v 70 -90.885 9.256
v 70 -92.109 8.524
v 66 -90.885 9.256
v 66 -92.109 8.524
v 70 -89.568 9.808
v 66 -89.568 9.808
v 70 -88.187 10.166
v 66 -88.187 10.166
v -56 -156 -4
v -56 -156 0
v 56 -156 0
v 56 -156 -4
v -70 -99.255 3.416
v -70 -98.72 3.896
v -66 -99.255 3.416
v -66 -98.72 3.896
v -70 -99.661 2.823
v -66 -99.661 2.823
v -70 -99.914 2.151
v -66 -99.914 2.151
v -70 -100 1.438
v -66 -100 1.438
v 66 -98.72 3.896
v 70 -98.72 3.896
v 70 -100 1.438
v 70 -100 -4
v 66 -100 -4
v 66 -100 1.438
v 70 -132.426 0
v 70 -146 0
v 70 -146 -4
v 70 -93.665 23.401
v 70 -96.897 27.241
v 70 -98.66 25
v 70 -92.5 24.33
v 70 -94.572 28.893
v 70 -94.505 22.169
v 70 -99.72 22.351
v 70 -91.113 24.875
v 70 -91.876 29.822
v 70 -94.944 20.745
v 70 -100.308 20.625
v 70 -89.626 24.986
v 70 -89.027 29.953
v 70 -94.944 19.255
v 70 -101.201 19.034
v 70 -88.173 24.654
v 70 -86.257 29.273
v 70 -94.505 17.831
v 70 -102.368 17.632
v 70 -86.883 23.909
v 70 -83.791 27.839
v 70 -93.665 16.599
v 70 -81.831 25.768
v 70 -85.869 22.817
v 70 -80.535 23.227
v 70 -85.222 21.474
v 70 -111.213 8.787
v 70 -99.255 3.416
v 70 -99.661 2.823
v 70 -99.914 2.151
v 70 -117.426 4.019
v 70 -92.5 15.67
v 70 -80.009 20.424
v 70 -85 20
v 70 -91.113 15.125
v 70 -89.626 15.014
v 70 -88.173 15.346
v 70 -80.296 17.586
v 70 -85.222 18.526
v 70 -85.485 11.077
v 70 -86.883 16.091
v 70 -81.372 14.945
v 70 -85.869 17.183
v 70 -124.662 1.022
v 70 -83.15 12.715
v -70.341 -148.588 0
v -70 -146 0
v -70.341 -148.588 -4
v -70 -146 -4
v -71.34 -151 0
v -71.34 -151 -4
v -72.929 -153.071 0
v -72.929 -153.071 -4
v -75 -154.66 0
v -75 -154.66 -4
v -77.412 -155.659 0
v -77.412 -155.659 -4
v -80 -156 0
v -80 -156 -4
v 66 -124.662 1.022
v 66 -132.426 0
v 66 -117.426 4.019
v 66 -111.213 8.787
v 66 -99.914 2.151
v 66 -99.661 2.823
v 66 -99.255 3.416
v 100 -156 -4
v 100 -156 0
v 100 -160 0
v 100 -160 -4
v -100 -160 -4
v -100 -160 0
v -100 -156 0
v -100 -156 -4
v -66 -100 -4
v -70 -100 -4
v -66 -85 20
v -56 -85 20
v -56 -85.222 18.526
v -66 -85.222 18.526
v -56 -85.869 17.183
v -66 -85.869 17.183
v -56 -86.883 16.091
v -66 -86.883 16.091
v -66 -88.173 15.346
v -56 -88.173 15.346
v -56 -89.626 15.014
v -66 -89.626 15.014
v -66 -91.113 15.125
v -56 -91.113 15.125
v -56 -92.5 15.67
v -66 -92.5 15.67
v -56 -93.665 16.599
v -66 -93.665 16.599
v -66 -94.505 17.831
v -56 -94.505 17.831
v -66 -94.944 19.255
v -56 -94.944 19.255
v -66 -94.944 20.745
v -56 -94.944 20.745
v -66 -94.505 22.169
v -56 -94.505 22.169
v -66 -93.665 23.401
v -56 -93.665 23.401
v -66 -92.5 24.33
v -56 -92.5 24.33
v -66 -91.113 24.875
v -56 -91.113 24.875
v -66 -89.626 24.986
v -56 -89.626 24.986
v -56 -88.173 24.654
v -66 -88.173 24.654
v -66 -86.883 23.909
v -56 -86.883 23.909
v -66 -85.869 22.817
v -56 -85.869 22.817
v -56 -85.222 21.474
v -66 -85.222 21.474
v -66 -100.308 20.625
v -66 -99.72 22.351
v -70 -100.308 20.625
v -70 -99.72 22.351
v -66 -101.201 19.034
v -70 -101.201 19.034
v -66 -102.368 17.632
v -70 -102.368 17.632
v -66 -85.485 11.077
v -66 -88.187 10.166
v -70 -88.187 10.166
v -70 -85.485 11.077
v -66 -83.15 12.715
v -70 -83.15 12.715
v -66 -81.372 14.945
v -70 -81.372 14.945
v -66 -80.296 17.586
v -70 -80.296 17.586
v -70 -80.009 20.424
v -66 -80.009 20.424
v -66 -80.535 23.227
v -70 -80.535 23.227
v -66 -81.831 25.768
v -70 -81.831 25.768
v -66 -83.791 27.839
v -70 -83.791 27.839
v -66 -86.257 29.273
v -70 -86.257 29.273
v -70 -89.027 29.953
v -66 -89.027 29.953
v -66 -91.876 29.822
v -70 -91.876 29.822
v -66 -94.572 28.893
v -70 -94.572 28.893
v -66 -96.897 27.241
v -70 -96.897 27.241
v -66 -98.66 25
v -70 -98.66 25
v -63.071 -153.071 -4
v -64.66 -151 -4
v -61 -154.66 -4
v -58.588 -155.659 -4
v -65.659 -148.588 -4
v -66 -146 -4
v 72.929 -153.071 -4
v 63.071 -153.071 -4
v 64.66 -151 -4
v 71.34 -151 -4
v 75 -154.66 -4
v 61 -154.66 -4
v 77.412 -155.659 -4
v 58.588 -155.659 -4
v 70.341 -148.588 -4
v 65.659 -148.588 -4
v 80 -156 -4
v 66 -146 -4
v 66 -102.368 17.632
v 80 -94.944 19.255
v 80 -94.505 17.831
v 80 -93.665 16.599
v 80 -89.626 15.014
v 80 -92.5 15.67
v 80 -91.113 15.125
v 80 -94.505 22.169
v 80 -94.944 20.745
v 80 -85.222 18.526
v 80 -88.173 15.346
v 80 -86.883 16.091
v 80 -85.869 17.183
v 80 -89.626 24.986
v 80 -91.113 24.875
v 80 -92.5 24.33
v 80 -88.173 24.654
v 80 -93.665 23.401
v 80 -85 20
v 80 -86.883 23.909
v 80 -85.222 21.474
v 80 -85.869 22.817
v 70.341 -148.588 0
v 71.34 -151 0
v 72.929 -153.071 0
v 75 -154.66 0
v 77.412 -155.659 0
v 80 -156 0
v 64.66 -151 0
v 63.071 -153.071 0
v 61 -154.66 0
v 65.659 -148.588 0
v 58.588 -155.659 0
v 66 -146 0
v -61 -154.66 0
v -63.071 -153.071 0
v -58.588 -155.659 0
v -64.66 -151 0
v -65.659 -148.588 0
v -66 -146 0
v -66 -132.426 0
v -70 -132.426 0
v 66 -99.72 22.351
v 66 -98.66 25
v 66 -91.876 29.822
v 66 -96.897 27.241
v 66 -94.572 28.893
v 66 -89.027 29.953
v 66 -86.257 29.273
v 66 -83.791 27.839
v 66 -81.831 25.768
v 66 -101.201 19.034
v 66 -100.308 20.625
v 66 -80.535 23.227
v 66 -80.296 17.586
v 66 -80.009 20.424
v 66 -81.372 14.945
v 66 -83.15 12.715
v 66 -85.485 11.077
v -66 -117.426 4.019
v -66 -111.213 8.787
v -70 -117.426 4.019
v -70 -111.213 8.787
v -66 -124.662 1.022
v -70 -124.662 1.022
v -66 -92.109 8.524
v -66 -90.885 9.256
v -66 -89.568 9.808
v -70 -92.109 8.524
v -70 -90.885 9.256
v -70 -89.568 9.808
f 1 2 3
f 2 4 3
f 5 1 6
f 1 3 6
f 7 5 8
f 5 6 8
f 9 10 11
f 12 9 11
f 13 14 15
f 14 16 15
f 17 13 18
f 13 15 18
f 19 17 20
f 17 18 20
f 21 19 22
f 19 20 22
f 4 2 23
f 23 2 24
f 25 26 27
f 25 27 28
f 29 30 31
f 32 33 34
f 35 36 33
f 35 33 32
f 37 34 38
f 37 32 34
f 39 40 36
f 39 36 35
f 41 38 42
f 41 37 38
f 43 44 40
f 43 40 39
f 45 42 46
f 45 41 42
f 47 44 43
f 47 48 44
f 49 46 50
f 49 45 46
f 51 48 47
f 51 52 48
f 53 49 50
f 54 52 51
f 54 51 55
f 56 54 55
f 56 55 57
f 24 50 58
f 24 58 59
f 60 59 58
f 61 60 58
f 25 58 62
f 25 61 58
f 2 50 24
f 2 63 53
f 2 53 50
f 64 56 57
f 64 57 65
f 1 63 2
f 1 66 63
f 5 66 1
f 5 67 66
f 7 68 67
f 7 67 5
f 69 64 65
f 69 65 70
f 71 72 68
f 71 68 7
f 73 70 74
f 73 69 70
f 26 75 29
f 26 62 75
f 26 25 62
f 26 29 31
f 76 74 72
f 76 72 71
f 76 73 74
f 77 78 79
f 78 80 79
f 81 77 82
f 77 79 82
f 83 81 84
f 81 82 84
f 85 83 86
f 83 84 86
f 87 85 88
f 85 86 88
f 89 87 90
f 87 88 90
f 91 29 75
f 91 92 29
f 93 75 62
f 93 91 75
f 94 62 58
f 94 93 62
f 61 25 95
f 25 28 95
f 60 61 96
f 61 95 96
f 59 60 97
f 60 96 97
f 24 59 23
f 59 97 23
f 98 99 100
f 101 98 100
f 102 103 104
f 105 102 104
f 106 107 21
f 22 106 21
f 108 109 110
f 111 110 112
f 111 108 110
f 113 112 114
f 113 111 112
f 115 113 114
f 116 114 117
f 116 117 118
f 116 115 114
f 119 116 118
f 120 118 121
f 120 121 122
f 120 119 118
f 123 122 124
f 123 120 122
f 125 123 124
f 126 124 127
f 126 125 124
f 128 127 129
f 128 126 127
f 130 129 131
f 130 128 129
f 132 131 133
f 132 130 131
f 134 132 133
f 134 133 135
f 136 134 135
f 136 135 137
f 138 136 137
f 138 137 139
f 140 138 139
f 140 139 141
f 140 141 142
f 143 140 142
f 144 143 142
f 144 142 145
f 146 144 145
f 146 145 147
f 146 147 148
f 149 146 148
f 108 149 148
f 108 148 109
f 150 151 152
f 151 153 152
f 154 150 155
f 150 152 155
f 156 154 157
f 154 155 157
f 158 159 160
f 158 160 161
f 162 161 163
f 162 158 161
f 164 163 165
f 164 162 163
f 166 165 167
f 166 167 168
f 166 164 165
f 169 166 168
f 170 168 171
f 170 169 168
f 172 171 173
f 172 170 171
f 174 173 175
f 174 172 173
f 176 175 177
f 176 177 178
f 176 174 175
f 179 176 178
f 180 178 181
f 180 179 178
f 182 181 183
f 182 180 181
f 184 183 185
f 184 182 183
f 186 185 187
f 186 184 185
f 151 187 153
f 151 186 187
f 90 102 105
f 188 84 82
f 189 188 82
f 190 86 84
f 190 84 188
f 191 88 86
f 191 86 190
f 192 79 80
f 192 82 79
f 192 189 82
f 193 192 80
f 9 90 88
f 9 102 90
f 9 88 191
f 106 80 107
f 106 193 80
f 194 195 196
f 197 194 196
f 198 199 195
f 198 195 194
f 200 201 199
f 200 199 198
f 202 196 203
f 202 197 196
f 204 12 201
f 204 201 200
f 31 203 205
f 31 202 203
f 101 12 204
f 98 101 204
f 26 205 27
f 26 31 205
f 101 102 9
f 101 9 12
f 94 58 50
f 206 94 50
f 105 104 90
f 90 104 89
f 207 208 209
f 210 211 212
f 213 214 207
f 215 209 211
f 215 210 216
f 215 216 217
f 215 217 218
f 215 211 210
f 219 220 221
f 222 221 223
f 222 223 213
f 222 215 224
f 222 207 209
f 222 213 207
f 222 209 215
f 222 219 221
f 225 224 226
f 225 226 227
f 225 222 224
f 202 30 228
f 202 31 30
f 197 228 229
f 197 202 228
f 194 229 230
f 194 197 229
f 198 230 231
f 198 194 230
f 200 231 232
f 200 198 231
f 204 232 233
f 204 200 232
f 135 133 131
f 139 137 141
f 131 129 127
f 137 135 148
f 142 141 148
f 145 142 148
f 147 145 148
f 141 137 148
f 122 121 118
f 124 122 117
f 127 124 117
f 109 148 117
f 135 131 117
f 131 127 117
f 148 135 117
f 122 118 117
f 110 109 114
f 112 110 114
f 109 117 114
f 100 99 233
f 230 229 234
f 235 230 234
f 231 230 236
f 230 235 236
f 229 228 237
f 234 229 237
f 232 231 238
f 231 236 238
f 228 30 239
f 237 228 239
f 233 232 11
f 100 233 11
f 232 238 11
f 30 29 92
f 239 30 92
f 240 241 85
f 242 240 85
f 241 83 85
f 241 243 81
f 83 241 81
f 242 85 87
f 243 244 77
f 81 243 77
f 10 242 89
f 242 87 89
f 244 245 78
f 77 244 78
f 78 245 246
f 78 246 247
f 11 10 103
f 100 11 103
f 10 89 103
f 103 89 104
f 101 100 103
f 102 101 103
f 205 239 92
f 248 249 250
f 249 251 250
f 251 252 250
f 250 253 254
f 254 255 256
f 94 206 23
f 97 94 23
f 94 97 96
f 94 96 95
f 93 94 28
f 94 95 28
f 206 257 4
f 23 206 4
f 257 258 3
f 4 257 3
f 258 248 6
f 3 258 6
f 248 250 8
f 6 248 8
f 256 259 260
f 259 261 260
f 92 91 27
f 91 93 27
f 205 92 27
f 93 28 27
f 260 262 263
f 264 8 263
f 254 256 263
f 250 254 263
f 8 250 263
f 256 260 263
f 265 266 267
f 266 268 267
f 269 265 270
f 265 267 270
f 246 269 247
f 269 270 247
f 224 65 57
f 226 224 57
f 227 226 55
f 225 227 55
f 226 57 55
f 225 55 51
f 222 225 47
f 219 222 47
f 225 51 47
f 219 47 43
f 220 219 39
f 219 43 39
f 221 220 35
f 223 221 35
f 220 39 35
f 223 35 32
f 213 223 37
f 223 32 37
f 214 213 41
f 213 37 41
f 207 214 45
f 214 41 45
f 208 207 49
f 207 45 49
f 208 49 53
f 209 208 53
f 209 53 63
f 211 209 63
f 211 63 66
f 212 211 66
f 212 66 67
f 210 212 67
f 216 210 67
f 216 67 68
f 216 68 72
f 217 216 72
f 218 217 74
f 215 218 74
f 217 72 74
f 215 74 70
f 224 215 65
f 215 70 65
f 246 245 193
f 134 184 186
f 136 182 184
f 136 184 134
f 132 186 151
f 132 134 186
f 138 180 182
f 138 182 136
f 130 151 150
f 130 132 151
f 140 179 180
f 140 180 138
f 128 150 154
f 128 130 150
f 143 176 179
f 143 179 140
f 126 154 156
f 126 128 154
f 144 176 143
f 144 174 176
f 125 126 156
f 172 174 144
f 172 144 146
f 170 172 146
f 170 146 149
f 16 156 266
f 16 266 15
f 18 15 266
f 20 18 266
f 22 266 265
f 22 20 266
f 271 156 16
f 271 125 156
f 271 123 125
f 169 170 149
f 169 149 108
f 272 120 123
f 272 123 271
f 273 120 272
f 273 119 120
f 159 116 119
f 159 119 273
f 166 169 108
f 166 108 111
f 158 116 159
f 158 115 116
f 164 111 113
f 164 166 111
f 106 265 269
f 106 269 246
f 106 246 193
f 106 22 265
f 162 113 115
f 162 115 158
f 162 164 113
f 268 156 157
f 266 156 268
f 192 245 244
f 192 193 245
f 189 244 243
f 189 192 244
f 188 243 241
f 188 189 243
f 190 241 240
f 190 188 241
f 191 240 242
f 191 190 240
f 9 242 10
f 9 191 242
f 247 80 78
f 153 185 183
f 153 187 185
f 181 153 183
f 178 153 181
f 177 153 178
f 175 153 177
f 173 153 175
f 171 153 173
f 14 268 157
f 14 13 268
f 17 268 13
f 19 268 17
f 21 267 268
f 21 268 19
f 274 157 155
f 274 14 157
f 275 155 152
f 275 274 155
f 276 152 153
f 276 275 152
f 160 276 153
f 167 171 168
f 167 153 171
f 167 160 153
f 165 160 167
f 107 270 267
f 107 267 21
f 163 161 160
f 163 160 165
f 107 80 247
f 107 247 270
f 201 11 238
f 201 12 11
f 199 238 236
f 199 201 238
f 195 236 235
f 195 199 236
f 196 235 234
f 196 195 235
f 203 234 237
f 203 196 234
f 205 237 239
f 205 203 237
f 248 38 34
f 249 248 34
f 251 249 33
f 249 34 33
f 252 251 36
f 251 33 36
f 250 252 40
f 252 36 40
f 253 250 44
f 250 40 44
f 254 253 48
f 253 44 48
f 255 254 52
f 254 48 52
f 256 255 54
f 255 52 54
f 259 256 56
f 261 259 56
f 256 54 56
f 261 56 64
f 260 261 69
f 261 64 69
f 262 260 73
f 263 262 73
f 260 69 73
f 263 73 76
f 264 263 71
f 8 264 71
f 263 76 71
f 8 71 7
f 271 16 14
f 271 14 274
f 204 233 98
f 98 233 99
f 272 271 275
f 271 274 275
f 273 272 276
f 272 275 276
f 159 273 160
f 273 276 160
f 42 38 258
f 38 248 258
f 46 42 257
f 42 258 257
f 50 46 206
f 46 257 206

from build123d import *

# Parameters (mm, degrees)
BOSS_EXTRU_1_DEPTH = 4
BOSS_EXTRU_2_DEPTH = 4
BOSS_EXTRU_3_START = -4
BOSS_EXTRU_3_DEPTH = 4
CONG_1_R           = 30
CONG_2_R           = 30
CONG_3_R           = 10
BOSS_EXTRU_4_DEPTH = 4
BOSS_EXTRU_5_DEPTH = 4
ESQUISSE7_R        = 5
BOSS_EXTRU_6_DEPTH = 10
ESQUISSE9_R        = 5
BOSS_EXTRU_7_DEPTH = 14
CONG_4_R           = 10
CONG_5_R           = 3


with BuildPart() as part:
    # Esquisse1 → Boss.-Extru.1 (new body)
    with BuildSketch(Plane.XY):
        Polygon((-70, -110), (-66, -110), (-66, -156), (66, -156), (66, -110), (70, -110), (70, -156), (100, -156), (100, -160), (-100, -160), (-100, -156), (-70, -156), align=None)
    extrude(amount=-BOSS_EXTRU_1_DEPTH)

    # Esquisse2 → Boss.-Extru.2 (add)
    with BuildSketch(Plane(origin=(70, 0, 0), x_dir=(0, 0, -1), z_dir=(1, 0, 0))):
        with BuildLine():
            Line((0, -120), (-20, -100))
            ThreePointArc((-20, -100), (-27.071067812, -82.928932188), (-10, -90))
            Line((-10, -90), (4, -110))
            Line((4, -110), (0, -110))
            Line((0, -110), (0, -120))
        make_face()
    extrude(amount=-BOSS_EXTRU_2_DEPTH)

    # Esquisse3 → Boss.-Extru.3 (add)
    with BuildSketch(Plane.ZY.offset(70).offset(BOSS_EXTRU_3_START)):
        with BuildLine():
            Line((-4, -110), (10, -90))
            ThreePointArc((10, -90), (27.071067812, -82.928932188), (20, -100))
            Line((20, -100), (0, -120))
            Line((0, -120), (0, -110))
            Line((0, -110), (-4, -110))
        make_face()
    extrude(amount=BOSS_EXTRU_3_DEPTH)

    # Congé1
    cong_1_edges = [part.edges().sort_by_distance(p)[0] for p in [
        (68, -120, 0),
        (-68, -120, 0),
    ]]
    fillet(cong_1_edges, radius=CONG_1_R)

    # Congé2
    cong_2_edges = [part.edges().sort_by_distance(p)[0] for p in [
        (68, -110, -4),
        (-68, -110, -4),
    ]]
    fillet(cong_2_edges, radius=CONG_2_R)

    # Congé3
    cong_3_edges = [part.edges().sort_by_distance(p)[0] for p in [
        (-70, -156, -2),
        (-66, -156, -2),
        (66, -156, -2),
        (70, -156, -2),
    ]]
    fillet(cong_3_edges, radius=CONG_3_R)

    # Esquisse4 → Boss.-Extru.4 (add)
    with BuildSketch(Plane.ZY.offset(70)):
        Polygon((-4, -119.456666925), (-4, -100), (3, -100), align=None)
    extrude(amount=-BOSS_EXTRU_4_DEPTH)

    # Esquisse6 → Boss.-Extru.5 (add)
    with BuildSketch(Plane(origin=(70, 0, 0), x_dir=(0, 0, -1), z_dir=(1, 0, 0))):
        Polygon((4, -119.456666925), (4, -100), (-3, -100), align=None)
    extrude(amount=-BOSS_EXTRU_5_DEPTH)

    # Esquisse7 → Boss.-Extru.6 (add)
    with BuildSketch(Plane(origin=(70, 0, 0), x_dir=(0, 0, -1), z_dir=(1, 0, 0))):
        with Locations(Location((-20, -90, 0), (0, 0, 90))):
            Circle(ESQUISSE7_R)
    extrude(amount=BOSS_EXTRU_6_DEPTH)

    # Esquisse9 → Boss.-Extru.7 (add)
    with BuildSketch(Plane.ZY.offset(70)):
        with Locations(Location((20, -90, 0), (0, 0, 90))):
            Circle(ESQUISSE9_R)
    extrude(amount=-BOSS_EXTRU_7_DEPTH)

    # Congé4
    cong_4_edges = [part.edges().sort_by_distance(p)[0] for p in [
        (68, -100, 20),
        (68, -90, 10),
        (-68, -90, 10),
        (-68, -100, 20),
    ]]
    fillet(cong_4_edges, radius=CONG_4_R)

    # Congé5
    cong_5_edges = [part.edges().sort_by_distance(p)[0] for p in [
        (-68, -100, 3),
        (68, -100, 3),
    ]]
    fillet(cong_5_edges, radius=CONG_5_R)


solid = part.part
